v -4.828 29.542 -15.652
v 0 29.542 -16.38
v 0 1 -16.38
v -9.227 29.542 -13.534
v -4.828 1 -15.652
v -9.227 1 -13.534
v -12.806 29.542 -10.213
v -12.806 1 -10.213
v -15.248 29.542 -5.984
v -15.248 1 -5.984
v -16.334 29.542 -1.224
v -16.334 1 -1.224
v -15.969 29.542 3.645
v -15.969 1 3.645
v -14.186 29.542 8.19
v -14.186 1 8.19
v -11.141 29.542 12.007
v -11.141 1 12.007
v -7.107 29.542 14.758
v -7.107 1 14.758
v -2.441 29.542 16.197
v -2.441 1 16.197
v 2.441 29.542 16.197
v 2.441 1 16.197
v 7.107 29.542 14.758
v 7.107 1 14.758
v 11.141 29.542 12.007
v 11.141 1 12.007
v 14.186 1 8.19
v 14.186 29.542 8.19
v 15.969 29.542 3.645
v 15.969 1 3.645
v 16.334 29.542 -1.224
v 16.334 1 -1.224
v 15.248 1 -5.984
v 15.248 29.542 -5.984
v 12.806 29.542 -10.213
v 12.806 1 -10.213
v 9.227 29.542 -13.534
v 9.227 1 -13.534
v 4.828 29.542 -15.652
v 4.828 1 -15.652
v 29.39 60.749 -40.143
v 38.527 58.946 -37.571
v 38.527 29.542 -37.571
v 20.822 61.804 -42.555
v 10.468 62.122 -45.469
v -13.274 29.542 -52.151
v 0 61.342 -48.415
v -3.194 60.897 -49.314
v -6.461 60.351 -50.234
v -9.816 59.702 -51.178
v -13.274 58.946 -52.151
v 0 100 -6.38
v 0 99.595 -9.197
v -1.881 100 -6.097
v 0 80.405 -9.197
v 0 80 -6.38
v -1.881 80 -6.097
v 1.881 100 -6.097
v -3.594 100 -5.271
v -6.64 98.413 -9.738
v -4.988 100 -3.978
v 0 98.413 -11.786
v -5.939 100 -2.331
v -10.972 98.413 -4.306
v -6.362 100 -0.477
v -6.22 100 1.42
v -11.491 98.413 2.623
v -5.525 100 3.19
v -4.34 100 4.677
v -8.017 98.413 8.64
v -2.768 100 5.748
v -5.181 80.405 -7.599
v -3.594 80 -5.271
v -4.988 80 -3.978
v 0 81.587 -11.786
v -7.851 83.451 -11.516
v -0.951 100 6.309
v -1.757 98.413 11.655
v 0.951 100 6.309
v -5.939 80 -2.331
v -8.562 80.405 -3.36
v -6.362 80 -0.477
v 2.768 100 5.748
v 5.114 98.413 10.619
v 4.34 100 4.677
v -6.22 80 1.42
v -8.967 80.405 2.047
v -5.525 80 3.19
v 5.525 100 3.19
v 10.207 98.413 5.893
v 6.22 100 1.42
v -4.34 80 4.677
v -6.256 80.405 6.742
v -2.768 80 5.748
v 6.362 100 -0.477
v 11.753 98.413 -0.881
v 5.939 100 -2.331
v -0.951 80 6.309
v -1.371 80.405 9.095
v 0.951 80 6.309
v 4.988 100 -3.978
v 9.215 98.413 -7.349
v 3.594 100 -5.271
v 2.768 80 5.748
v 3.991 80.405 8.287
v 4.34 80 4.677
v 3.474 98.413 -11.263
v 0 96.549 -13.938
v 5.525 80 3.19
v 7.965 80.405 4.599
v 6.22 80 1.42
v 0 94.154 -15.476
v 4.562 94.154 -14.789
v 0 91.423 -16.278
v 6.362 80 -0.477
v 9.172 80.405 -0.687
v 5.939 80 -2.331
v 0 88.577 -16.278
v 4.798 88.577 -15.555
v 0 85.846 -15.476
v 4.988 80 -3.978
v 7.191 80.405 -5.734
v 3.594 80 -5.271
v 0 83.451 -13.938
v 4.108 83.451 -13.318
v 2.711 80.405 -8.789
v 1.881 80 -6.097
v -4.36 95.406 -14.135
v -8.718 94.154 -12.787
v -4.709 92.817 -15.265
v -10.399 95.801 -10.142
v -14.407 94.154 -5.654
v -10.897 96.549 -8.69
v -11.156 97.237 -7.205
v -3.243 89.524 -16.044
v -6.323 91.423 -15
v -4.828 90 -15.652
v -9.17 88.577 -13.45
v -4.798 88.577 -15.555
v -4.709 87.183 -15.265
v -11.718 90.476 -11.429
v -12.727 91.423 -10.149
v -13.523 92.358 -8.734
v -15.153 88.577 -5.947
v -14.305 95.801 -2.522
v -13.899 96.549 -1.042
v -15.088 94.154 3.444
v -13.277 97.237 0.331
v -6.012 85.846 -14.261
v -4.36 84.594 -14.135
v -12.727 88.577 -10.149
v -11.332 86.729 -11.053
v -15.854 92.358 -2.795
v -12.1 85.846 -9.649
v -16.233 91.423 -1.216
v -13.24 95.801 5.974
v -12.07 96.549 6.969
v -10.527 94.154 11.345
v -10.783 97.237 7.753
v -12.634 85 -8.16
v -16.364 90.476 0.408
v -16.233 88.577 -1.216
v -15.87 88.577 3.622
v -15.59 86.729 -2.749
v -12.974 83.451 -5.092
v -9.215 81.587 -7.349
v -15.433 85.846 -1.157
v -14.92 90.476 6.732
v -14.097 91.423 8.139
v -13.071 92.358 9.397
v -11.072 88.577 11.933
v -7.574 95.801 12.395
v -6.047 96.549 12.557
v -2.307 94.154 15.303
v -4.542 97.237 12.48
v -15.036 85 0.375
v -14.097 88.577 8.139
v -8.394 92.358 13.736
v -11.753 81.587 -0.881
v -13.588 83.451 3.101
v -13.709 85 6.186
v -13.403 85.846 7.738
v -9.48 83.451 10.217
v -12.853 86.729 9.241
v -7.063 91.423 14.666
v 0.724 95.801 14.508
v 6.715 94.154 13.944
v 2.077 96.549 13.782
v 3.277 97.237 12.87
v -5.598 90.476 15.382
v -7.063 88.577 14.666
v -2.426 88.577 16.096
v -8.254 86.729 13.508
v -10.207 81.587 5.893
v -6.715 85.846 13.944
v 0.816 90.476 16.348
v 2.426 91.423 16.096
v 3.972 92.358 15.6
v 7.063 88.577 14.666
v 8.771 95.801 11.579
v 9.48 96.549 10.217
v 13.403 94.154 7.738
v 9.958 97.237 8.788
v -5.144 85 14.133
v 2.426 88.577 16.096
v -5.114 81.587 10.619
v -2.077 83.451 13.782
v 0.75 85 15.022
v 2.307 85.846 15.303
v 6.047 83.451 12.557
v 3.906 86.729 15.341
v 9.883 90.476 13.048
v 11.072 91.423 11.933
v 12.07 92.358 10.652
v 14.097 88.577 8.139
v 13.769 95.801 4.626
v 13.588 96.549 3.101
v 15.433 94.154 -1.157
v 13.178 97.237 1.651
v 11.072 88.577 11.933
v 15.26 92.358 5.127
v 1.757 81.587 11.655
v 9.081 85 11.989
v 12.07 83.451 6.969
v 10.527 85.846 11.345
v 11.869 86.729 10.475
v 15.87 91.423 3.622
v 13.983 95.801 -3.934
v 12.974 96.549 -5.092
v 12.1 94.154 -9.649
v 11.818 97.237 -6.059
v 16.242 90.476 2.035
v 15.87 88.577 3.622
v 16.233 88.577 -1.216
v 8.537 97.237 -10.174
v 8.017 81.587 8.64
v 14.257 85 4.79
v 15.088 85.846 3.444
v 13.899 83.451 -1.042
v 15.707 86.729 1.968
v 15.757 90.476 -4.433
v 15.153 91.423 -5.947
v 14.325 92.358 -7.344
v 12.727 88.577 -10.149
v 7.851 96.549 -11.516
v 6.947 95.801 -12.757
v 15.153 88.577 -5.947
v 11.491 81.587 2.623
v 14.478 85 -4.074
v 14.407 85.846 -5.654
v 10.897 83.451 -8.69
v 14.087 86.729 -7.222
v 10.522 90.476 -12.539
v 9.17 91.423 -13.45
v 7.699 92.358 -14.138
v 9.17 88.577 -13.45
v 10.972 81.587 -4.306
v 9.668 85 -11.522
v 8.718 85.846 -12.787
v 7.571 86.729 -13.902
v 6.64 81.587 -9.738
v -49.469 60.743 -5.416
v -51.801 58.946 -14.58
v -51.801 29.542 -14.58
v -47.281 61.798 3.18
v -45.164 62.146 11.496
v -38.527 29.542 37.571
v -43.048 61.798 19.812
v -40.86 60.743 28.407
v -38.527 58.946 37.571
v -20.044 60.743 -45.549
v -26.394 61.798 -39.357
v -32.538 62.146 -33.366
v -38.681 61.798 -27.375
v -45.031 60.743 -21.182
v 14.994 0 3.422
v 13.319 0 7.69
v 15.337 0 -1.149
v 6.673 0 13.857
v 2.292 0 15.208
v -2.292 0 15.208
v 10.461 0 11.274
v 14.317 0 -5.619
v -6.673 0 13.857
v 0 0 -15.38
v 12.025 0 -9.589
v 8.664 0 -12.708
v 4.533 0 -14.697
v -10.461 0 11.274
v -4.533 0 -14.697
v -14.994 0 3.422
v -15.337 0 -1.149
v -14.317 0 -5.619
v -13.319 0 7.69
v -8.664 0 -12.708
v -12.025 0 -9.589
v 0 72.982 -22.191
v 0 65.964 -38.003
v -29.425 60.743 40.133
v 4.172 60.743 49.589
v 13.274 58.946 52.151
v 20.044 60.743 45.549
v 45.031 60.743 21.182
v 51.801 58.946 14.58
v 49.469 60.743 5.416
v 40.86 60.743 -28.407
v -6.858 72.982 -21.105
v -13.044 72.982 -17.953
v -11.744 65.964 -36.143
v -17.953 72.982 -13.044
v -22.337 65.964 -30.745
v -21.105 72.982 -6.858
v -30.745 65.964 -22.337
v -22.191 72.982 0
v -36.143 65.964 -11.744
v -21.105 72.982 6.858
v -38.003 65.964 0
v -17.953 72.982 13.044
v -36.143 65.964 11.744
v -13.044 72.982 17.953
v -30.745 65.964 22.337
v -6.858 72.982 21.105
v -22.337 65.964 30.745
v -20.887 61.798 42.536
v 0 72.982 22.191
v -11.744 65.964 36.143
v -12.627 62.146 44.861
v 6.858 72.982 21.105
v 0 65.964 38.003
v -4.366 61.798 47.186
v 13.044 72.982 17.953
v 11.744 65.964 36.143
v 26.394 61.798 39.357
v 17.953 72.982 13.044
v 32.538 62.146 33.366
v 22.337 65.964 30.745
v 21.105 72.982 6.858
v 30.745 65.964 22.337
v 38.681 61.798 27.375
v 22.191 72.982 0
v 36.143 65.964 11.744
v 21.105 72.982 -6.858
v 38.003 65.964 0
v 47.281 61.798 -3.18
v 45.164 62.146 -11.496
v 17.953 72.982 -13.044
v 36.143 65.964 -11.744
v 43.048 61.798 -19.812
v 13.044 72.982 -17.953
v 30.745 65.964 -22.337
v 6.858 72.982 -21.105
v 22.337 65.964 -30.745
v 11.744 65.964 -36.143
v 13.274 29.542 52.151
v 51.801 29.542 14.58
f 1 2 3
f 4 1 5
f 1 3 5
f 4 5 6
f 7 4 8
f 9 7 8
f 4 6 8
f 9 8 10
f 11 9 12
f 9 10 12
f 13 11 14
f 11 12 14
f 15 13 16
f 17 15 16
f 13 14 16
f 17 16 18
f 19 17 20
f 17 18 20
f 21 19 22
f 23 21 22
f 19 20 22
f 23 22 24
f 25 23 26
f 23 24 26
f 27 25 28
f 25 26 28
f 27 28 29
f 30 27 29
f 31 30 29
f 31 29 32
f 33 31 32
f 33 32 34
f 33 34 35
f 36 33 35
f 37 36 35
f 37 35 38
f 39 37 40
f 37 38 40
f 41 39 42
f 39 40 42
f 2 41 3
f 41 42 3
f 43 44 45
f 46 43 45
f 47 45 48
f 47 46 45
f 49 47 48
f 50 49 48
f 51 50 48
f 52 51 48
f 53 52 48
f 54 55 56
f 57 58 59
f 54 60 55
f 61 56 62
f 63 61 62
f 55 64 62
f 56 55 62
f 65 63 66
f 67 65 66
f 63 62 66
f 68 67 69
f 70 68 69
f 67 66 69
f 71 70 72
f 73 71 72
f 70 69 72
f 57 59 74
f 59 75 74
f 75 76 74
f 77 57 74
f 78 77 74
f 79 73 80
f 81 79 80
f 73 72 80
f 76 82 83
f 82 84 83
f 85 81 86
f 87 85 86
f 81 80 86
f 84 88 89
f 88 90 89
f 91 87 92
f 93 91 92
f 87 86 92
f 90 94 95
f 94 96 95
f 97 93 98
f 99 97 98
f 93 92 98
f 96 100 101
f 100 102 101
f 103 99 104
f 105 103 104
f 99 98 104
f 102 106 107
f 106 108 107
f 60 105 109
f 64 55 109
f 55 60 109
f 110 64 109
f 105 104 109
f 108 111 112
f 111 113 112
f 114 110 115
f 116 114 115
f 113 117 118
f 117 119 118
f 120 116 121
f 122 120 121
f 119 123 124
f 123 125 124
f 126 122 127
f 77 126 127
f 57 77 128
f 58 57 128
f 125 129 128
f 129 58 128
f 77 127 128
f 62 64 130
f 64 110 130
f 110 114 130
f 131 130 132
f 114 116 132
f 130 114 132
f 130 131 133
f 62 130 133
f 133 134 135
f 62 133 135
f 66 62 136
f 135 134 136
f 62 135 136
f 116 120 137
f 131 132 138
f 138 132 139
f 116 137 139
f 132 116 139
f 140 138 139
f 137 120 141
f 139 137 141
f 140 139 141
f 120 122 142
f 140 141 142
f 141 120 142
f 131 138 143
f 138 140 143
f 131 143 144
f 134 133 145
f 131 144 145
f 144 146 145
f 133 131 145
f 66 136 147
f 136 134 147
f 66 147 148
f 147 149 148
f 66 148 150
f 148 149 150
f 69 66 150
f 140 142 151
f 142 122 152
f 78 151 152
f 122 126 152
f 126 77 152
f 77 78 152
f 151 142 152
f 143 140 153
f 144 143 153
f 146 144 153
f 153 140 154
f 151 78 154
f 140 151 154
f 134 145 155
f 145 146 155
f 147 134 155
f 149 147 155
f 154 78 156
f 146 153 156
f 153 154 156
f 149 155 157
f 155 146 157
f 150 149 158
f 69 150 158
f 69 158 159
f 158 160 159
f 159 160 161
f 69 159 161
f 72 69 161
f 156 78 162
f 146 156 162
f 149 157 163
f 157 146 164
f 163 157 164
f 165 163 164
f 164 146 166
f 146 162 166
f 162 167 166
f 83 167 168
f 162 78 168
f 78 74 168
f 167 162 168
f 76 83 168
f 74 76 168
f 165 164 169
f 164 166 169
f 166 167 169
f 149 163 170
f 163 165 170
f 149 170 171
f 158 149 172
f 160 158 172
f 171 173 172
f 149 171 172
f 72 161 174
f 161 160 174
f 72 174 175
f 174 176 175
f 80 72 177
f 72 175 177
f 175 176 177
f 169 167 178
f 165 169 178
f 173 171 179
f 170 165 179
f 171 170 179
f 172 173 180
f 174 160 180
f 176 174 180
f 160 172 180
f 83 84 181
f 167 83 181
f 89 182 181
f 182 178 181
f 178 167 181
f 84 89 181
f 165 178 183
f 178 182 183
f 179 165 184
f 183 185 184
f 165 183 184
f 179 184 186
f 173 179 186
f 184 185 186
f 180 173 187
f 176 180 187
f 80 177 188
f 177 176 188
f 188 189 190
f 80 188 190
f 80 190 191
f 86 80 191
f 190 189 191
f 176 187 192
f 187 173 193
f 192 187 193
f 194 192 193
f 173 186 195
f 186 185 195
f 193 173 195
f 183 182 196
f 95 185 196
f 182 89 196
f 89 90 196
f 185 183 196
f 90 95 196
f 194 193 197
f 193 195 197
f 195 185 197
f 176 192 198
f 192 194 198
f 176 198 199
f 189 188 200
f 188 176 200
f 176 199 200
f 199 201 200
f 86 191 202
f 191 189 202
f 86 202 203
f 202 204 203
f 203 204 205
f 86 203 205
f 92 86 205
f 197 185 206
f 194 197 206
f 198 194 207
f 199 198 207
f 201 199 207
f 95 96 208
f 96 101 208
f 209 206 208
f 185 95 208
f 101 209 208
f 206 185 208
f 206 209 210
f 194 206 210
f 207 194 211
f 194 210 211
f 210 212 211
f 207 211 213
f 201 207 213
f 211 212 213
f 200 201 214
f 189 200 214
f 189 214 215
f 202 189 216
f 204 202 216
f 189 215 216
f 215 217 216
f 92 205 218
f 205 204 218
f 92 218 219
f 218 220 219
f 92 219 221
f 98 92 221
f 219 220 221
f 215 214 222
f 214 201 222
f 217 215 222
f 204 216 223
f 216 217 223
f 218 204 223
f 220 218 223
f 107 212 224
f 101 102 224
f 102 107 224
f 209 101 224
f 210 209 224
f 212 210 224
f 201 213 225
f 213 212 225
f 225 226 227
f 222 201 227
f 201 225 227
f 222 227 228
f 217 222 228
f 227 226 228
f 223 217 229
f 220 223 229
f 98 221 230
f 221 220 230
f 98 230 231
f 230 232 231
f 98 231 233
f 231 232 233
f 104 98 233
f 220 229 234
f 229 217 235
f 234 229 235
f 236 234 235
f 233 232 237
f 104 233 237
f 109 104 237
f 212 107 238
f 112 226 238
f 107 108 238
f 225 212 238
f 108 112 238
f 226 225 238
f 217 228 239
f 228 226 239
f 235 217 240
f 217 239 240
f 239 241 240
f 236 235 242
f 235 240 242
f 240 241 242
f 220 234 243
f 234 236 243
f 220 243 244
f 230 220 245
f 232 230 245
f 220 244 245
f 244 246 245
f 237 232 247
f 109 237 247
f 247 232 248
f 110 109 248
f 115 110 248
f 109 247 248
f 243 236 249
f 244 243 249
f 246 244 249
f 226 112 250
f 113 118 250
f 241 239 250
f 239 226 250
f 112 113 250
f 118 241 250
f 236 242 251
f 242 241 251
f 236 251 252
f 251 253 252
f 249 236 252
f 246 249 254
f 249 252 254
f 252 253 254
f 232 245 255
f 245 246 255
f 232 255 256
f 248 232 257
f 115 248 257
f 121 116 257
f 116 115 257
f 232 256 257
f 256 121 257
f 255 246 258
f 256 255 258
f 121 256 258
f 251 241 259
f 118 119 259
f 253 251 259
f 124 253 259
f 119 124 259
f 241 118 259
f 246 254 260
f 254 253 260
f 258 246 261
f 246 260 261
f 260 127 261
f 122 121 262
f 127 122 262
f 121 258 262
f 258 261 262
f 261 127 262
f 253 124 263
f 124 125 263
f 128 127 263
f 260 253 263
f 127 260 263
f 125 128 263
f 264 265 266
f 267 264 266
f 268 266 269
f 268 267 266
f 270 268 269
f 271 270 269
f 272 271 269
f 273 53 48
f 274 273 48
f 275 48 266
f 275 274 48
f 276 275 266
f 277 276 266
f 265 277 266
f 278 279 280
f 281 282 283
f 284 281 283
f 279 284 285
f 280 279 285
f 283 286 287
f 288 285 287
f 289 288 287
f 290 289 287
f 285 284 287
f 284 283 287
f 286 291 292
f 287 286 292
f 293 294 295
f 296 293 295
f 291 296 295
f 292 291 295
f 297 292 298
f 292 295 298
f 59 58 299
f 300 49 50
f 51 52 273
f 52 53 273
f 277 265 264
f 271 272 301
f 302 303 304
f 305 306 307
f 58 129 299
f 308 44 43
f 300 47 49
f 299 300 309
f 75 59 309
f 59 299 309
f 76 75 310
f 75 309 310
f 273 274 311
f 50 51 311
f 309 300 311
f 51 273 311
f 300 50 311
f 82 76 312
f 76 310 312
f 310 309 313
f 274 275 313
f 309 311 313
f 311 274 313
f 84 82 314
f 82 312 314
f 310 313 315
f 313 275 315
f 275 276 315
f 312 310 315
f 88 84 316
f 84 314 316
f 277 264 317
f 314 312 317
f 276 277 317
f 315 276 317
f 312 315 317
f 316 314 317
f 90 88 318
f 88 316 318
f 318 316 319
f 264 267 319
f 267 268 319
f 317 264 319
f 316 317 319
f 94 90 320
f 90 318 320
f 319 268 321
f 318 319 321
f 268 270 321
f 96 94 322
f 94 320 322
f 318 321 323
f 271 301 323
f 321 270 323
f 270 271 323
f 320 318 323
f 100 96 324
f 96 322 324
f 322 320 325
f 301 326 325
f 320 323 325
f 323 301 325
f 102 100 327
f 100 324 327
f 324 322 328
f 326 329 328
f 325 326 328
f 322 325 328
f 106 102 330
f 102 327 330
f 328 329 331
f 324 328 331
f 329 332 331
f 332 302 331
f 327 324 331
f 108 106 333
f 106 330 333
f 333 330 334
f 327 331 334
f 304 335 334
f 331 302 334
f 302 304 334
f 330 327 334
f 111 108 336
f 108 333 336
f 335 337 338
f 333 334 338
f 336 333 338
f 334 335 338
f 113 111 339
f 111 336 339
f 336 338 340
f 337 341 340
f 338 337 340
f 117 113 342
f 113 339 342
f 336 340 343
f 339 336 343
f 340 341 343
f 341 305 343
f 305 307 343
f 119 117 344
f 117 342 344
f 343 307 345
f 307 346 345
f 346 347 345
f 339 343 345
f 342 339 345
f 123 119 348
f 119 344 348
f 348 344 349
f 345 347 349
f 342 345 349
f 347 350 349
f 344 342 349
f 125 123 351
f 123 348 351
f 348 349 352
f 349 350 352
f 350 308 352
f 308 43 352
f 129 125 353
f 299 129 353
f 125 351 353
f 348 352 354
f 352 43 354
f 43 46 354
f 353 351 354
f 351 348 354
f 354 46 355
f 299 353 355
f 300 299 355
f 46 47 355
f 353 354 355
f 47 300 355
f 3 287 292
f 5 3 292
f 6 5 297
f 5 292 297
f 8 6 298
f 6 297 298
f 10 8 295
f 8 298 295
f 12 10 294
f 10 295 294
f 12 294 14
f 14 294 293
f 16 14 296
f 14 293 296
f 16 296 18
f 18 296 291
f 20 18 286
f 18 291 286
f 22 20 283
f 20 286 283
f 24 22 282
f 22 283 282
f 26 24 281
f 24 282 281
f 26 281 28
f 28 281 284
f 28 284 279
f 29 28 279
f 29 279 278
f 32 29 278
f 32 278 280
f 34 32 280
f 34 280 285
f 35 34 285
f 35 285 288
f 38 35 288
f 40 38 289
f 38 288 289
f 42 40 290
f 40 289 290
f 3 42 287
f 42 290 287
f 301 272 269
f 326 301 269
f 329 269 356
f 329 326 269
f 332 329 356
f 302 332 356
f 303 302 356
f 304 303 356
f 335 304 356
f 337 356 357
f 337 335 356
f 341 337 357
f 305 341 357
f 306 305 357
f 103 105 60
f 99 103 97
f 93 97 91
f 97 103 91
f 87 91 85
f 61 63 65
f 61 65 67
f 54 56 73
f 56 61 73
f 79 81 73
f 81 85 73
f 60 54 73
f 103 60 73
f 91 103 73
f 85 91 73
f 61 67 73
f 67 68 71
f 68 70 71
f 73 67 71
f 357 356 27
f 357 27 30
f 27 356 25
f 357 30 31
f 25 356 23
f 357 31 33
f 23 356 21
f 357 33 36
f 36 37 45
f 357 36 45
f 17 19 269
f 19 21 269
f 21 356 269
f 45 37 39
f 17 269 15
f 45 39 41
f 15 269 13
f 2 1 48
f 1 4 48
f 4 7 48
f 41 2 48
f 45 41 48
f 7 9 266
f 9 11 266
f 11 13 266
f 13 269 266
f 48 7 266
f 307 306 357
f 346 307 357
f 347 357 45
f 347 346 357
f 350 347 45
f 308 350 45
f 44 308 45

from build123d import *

# Parameters (mm, degrees)
SKETCH2_OUTSIDE_W  = 146.052
SKETCH2_OUTSIDE_H  = 146.052
CUT_EXTRUDE1_DEPTH = 126.665925527
CHAMFER1_SIZE      = 1


with BuildPart() as part:
    # Sketch1 → Revolve1 (revolve)
    with BuildSketch(Plane.XY, mode=Mode.PRIVATE) as revolve1_sk:
        with BuildLine():
            Line((0, 100), (-6.380027739, 100))
            ThreePointArc((-6.380027739, 100), (-16.380027739, 90), (-6.380027739, 80))
            Line((-6.380027739, 80), (-53.814147018, 58.94590846))
            Line((-53.814147018, 58.94590846), (-53.814147018, 29.542302358))
            Line((-53.814147018, 29.542302358), (-16.380027739, 29.542302358))
            Line((-16.380027739, 29.542302358), (-16.380027739, 0))
            Line((-16.380027739, 0), (0, 0))
            Line((0, 0), (0, 100))
        make_face()
    revolve(revolve1_sk.sketch.rotate(Axis((0, 0, 0), (0, 1, 0)), 270), axis=Axis((0, 0, 0), (0, 1, 0)))

    # Sketch2 outside → Cut-Extrude1 (cut, through all)
    with BuildSketch(Plane(origin=(0, 100, 0), x_dir=(1, 0, 0), z_dir=(0, 1, 0))):
        Rectangle(SKETCH2_OUTSIDE_W, SKETCH2_OUTSIDE_H)
        Polygon((-38.527261507, -37.5714325), (13.274184248, -52.151303453), (51.801445755, -14.579870953), (38.527261507, 37.5714325), (-13.274184248, 52.151303453), (-51.801445755, 14.579870953), align=None, mode=Mode.SUBTRACT)
    extrude(amount=-CUT_EXTRUDE1_DEPTH, mode=Mode.SUBTRACT)

    # Chamfer1
    chamfer1_edges = [part.edges().sort_by_distance(p)[0] for p in [
        (0, 0, 16.380027739),
    ]]
    chamfer(chamfer1_edges, length=CHAMFER1_SIZE)


solid = part.part
